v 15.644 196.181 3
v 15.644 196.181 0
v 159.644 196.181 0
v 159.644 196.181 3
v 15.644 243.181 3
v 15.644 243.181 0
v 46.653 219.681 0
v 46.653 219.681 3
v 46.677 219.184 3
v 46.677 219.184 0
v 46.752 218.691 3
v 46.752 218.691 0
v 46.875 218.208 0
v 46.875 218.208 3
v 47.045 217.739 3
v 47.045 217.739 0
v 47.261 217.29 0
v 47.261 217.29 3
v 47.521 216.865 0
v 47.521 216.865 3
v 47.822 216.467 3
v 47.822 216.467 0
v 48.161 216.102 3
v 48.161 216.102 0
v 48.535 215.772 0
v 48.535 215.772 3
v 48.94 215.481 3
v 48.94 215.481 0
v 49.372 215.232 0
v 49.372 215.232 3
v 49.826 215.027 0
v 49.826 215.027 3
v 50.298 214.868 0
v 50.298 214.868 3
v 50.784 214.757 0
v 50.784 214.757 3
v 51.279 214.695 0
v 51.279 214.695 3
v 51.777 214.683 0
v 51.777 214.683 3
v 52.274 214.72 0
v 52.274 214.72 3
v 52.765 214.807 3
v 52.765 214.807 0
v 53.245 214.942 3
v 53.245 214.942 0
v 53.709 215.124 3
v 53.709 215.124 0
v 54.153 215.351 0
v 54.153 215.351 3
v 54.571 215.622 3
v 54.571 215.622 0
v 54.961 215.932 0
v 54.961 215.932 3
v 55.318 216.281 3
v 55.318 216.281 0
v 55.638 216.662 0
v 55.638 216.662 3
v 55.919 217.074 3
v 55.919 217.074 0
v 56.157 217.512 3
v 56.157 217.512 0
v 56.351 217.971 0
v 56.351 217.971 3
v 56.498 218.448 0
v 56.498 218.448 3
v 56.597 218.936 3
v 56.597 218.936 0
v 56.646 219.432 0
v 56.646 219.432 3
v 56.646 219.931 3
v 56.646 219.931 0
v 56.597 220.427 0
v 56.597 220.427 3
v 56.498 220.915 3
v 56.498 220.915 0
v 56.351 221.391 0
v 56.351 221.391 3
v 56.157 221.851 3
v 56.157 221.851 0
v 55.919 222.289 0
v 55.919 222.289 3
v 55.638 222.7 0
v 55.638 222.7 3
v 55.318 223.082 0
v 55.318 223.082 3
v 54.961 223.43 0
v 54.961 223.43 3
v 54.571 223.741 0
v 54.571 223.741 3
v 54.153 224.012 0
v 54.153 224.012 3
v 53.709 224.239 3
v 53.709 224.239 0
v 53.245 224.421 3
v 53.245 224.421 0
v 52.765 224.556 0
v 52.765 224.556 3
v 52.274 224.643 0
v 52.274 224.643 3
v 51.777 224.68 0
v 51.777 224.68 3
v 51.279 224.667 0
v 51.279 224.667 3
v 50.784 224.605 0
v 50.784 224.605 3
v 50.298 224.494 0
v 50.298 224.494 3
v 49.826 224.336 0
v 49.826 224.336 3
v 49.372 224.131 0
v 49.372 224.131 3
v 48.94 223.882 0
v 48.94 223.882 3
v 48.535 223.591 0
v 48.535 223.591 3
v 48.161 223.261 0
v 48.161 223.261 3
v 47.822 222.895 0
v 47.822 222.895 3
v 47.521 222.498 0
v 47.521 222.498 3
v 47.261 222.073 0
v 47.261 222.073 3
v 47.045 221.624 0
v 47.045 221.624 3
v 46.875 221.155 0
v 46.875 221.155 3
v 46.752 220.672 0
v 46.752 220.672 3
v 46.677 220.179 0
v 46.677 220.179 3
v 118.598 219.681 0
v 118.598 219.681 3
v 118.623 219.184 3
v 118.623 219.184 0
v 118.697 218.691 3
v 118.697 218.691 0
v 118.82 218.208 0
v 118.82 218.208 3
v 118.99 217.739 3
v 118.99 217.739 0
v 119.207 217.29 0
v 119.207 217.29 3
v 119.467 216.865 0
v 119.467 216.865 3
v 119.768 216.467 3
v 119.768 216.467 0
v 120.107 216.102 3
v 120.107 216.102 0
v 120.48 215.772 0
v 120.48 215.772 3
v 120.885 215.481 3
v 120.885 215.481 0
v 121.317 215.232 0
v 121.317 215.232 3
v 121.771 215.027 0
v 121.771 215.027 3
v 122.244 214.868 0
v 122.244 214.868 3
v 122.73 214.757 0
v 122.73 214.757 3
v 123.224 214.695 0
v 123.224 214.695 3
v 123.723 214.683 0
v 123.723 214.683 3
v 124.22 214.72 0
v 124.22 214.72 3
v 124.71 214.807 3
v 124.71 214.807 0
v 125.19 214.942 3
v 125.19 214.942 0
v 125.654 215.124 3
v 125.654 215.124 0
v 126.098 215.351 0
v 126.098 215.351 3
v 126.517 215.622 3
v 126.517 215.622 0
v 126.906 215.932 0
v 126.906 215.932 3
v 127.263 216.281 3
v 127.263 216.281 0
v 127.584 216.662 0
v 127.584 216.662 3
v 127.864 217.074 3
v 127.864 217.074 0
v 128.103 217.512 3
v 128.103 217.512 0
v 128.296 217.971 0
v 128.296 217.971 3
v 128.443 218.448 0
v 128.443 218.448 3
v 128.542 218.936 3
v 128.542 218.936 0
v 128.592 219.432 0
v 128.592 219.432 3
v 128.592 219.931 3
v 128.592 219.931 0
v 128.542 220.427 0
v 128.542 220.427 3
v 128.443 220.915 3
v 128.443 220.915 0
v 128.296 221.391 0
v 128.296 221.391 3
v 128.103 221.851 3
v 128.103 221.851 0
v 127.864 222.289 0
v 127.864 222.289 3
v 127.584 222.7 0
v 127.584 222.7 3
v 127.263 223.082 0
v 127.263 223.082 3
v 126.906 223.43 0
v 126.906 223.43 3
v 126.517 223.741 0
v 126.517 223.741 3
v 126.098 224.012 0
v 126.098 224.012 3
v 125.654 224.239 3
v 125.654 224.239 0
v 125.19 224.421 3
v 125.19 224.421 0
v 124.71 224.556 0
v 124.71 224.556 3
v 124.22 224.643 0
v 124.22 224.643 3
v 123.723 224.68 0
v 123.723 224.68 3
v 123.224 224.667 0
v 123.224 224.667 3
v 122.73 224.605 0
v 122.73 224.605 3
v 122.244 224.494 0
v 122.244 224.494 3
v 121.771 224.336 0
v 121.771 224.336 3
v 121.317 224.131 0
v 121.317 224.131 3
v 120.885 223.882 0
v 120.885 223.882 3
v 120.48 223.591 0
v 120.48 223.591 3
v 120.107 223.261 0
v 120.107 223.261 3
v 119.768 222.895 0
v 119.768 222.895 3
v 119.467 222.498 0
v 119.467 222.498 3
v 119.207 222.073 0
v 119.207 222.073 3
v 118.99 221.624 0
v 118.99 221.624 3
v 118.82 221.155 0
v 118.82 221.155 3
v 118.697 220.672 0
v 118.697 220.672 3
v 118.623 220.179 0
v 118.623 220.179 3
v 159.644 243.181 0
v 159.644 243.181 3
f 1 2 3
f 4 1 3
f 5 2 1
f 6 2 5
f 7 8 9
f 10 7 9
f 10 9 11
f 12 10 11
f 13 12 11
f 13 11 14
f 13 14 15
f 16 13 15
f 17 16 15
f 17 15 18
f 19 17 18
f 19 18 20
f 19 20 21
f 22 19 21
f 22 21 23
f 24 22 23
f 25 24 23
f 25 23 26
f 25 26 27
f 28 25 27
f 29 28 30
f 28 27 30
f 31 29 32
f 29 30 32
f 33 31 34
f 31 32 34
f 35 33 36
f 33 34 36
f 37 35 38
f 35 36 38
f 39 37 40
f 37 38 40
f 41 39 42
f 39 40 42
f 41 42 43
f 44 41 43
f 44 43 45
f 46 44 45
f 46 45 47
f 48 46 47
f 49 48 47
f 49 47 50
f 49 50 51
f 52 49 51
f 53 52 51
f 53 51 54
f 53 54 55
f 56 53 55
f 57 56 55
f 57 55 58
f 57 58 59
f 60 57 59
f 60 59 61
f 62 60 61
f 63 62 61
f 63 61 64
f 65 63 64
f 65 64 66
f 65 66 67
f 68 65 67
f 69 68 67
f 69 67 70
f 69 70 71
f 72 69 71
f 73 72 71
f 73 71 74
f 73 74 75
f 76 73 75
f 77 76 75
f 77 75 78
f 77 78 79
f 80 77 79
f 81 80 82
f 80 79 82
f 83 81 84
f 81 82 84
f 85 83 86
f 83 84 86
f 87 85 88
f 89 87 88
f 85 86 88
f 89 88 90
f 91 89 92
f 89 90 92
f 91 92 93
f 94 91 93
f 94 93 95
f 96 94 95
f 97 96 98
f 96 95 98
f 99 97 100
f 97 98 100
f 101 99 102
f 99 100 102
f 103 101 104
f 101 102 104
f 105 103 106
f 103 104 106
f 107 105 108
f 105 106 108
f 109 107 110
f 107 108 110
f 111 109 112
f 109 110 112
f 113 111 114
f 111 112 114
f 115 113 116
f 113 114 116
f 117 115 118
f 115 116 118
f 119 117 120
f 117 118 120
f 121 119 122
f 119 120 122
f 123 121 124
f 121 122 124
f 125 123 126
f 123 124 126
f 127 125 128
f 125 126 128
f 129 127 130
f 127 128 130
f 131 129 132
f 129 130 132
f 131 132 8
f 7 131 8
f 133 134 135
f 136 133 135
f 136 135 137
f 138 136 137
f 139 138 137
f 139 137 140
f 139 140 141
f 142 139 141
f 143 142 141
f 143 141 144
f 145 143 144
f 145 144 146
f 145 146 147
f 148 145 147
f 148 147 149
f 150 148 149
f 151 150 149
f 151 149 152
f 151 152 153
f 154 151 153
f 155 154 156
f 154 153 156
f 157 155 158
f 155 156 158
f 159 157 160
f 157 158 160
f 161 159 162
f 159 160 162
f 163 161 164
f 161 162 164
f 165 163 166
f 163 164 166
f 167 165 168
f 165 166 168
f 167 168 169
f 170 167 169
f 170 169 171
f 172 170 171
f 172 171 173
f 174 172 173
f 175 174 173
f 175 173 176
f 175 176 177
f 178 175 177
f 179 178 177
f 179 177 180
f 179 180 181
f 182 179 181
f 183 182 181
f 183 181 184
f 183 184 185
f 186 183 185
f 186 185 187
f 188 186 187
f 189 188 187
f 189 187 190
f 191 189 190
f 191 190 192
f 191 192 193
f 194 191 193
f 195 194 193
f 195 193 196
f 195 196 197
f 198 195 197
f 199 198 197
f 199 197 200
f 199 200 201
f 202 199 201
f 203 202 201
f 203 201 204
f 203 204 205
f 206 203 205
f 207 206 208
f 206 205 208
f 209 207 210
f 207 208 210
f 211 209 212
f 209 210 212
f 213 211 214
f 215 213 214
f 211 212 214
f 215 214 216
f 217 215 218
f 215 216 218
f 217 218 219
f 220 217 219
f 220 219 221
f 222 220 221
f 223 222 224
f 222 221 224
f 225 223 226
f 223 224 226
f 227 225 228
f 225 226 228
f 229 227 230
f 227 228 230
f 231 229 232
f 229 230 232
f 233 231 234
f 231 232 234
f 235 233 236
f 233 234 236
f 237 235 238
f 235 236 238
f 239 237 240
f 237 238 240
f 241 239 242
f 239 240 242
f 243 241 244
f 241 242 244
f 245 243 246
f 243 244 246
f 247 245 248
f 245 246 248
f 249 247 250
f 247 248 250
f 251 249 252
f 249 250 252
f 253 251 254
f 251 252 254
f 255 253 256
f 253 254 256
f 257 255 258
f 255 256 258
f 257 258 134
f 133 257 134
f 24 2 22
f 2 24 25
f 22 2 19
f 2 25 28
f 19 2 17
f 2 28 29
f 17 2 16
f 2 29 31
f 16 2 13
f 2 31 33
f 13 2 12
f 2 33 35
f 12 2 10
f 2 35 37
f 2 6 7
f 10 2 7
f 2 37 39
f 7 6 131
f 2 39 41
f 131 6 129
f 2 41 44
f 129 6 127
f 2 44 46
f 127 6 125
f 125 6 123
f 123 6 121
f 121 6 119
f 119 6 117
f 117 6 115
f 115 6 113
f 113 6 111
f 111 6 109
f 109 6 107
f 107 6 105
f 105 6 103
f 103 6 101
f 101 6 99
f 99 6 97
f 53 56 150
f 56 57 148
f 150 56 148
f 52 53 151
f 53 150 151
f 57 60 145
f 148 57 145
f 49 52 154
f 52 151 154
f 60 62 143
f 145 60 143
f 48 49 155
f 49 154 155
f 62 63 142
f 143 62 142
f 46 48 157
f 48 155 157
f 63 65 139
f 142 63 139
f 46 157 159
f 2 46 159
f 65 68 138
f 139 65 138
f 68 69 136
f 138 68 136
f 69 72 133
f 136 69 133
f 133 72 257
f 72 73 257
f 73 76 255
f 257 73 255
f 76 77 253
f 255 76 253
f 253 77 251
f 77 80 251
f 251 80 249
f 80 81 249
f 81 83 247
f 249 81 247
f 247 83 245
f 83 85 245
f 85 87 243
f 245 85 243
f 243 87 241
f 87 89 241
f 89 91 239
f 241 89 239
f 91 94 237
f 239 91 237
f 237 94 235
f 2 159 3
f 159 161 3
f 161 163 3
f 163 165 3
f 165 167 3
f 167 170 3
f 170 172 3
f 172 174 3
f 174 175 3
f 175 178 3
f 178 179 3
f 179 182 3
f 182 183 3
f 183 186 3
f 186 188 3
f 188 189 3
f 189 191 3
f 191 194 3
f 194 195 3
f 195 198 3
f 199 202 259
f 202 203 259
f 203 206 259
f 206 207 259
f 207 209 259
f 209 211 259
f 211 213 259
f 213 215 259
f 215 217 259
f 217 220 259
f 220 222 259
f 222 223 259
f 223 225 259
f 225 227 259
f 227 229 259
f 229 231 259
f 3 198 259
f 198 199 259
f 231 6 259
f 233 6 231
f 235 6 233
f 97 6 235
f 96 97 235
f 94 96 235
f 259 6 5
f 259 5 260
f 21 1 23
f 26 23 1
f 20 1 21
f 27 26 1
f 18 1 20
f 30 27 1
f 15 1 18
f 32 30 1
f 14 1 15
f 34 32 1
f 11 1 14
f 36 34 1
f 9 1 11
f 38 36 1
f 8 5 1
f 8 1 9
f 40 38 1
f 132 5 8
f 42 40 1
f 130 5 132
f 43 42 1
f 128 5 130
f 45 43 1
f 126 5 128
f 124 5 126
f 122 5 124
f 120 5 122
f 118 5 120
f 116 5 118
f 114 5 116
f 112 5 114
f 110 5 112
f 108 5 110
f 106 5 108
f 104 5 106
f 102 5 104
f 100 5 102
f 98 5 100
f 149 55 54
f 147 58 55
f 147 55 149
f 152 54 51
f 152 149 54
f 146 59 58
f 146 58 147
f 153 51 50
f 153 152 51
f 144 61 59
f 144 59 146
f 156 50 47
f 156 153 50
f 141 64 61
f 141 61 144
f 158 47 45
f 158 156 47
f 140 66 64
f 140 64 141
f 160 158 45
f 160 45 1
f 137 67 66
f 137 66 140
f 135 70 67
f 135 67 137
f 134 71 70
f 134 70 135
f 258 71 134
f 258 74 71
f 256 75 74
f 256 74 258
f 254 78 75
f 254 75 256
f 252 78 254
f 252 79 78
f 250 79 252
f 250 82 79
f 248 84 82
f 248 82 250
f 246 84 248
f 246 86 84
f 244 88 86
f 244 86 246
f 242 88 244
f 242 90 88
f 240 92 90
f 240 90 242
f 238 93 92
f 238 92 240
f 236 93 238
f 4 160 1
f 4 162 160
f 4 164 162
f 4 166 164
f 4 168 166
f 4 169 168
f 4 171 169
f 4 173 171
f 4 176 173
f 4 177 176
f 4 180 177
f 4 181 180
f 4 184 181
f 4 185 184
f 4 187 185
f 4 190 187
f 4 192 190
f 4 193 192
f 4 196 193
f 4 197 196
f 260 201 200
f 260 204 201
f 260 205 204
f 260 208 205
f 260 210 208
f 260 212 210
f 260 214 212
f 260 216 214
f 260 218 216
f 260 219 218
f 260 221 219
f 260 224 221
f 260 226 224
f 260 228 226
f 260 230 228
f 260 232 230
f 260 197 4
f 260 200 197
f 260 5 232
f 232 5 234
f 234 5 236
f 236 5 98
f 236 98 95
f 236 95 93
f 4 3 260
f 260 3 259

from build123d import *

# Parameters (mm, degrees)
SKETCH1_W           = 144
SKETCH1_H           = 47
BOSS_EXTRUDE1_DEPTH = 3
CUT_EXTRUDE2_DEPTH  = 10


with BuildPart() as part:
    # Sketch1 → Boss-Extrude1 (new body)
    with BuildSketch(Plane.XY):
        with Locations((87.644313661, 219.681377026)):
            Rectangle(SKETCH1_W, SKETCH1_H)
    extrude(amount=BOSS_EXTRUDE1_DEPTH)

    # Sketch5 → Cut-Extrude2 (cut)
    with BuildSketch(Plane.XY.offset(3)):
        with BuildLine():
            ThreePointArc((56.652582595, 219.681377026), (51.652582595, 224.681377026), (46.652582595, 219.681377026))
            Line((46.652582595, 219.681377026), (56.652582595, 219.681377026))
        make_face()
        with BuildLine():
            Line((56.652582595, 219.681377026), (46.652582595, 219.681377026))
            ThreePointArc((46.652582595, 219.681377026), (51.652582595, 214.681377026), (56.652582595, 219.681377026))
        make_face()
        with BuildLine():
            ThreePointArc((128.597865768, 219.681377026), (123.597865768, 224.681377026), (118.597865768, 219.681377026))
            Line((118.597865768, 219.681377026), (128.597865768, 219.681377026))
        make_face()
        with BuildLine():
            Line((128.597865768, 219.681377026), (118.597865768, 219.681377026))
            ThreePointArc((118.597865768, 219.681377026), (123.597865768, 214.681377026), (128.597865768, 219.681377026))
        make_face()
    extrude(amount=-CUT_EXTRUDE2_DEPTH, mode=Mode.SUBTRACT)


solid = part.part
